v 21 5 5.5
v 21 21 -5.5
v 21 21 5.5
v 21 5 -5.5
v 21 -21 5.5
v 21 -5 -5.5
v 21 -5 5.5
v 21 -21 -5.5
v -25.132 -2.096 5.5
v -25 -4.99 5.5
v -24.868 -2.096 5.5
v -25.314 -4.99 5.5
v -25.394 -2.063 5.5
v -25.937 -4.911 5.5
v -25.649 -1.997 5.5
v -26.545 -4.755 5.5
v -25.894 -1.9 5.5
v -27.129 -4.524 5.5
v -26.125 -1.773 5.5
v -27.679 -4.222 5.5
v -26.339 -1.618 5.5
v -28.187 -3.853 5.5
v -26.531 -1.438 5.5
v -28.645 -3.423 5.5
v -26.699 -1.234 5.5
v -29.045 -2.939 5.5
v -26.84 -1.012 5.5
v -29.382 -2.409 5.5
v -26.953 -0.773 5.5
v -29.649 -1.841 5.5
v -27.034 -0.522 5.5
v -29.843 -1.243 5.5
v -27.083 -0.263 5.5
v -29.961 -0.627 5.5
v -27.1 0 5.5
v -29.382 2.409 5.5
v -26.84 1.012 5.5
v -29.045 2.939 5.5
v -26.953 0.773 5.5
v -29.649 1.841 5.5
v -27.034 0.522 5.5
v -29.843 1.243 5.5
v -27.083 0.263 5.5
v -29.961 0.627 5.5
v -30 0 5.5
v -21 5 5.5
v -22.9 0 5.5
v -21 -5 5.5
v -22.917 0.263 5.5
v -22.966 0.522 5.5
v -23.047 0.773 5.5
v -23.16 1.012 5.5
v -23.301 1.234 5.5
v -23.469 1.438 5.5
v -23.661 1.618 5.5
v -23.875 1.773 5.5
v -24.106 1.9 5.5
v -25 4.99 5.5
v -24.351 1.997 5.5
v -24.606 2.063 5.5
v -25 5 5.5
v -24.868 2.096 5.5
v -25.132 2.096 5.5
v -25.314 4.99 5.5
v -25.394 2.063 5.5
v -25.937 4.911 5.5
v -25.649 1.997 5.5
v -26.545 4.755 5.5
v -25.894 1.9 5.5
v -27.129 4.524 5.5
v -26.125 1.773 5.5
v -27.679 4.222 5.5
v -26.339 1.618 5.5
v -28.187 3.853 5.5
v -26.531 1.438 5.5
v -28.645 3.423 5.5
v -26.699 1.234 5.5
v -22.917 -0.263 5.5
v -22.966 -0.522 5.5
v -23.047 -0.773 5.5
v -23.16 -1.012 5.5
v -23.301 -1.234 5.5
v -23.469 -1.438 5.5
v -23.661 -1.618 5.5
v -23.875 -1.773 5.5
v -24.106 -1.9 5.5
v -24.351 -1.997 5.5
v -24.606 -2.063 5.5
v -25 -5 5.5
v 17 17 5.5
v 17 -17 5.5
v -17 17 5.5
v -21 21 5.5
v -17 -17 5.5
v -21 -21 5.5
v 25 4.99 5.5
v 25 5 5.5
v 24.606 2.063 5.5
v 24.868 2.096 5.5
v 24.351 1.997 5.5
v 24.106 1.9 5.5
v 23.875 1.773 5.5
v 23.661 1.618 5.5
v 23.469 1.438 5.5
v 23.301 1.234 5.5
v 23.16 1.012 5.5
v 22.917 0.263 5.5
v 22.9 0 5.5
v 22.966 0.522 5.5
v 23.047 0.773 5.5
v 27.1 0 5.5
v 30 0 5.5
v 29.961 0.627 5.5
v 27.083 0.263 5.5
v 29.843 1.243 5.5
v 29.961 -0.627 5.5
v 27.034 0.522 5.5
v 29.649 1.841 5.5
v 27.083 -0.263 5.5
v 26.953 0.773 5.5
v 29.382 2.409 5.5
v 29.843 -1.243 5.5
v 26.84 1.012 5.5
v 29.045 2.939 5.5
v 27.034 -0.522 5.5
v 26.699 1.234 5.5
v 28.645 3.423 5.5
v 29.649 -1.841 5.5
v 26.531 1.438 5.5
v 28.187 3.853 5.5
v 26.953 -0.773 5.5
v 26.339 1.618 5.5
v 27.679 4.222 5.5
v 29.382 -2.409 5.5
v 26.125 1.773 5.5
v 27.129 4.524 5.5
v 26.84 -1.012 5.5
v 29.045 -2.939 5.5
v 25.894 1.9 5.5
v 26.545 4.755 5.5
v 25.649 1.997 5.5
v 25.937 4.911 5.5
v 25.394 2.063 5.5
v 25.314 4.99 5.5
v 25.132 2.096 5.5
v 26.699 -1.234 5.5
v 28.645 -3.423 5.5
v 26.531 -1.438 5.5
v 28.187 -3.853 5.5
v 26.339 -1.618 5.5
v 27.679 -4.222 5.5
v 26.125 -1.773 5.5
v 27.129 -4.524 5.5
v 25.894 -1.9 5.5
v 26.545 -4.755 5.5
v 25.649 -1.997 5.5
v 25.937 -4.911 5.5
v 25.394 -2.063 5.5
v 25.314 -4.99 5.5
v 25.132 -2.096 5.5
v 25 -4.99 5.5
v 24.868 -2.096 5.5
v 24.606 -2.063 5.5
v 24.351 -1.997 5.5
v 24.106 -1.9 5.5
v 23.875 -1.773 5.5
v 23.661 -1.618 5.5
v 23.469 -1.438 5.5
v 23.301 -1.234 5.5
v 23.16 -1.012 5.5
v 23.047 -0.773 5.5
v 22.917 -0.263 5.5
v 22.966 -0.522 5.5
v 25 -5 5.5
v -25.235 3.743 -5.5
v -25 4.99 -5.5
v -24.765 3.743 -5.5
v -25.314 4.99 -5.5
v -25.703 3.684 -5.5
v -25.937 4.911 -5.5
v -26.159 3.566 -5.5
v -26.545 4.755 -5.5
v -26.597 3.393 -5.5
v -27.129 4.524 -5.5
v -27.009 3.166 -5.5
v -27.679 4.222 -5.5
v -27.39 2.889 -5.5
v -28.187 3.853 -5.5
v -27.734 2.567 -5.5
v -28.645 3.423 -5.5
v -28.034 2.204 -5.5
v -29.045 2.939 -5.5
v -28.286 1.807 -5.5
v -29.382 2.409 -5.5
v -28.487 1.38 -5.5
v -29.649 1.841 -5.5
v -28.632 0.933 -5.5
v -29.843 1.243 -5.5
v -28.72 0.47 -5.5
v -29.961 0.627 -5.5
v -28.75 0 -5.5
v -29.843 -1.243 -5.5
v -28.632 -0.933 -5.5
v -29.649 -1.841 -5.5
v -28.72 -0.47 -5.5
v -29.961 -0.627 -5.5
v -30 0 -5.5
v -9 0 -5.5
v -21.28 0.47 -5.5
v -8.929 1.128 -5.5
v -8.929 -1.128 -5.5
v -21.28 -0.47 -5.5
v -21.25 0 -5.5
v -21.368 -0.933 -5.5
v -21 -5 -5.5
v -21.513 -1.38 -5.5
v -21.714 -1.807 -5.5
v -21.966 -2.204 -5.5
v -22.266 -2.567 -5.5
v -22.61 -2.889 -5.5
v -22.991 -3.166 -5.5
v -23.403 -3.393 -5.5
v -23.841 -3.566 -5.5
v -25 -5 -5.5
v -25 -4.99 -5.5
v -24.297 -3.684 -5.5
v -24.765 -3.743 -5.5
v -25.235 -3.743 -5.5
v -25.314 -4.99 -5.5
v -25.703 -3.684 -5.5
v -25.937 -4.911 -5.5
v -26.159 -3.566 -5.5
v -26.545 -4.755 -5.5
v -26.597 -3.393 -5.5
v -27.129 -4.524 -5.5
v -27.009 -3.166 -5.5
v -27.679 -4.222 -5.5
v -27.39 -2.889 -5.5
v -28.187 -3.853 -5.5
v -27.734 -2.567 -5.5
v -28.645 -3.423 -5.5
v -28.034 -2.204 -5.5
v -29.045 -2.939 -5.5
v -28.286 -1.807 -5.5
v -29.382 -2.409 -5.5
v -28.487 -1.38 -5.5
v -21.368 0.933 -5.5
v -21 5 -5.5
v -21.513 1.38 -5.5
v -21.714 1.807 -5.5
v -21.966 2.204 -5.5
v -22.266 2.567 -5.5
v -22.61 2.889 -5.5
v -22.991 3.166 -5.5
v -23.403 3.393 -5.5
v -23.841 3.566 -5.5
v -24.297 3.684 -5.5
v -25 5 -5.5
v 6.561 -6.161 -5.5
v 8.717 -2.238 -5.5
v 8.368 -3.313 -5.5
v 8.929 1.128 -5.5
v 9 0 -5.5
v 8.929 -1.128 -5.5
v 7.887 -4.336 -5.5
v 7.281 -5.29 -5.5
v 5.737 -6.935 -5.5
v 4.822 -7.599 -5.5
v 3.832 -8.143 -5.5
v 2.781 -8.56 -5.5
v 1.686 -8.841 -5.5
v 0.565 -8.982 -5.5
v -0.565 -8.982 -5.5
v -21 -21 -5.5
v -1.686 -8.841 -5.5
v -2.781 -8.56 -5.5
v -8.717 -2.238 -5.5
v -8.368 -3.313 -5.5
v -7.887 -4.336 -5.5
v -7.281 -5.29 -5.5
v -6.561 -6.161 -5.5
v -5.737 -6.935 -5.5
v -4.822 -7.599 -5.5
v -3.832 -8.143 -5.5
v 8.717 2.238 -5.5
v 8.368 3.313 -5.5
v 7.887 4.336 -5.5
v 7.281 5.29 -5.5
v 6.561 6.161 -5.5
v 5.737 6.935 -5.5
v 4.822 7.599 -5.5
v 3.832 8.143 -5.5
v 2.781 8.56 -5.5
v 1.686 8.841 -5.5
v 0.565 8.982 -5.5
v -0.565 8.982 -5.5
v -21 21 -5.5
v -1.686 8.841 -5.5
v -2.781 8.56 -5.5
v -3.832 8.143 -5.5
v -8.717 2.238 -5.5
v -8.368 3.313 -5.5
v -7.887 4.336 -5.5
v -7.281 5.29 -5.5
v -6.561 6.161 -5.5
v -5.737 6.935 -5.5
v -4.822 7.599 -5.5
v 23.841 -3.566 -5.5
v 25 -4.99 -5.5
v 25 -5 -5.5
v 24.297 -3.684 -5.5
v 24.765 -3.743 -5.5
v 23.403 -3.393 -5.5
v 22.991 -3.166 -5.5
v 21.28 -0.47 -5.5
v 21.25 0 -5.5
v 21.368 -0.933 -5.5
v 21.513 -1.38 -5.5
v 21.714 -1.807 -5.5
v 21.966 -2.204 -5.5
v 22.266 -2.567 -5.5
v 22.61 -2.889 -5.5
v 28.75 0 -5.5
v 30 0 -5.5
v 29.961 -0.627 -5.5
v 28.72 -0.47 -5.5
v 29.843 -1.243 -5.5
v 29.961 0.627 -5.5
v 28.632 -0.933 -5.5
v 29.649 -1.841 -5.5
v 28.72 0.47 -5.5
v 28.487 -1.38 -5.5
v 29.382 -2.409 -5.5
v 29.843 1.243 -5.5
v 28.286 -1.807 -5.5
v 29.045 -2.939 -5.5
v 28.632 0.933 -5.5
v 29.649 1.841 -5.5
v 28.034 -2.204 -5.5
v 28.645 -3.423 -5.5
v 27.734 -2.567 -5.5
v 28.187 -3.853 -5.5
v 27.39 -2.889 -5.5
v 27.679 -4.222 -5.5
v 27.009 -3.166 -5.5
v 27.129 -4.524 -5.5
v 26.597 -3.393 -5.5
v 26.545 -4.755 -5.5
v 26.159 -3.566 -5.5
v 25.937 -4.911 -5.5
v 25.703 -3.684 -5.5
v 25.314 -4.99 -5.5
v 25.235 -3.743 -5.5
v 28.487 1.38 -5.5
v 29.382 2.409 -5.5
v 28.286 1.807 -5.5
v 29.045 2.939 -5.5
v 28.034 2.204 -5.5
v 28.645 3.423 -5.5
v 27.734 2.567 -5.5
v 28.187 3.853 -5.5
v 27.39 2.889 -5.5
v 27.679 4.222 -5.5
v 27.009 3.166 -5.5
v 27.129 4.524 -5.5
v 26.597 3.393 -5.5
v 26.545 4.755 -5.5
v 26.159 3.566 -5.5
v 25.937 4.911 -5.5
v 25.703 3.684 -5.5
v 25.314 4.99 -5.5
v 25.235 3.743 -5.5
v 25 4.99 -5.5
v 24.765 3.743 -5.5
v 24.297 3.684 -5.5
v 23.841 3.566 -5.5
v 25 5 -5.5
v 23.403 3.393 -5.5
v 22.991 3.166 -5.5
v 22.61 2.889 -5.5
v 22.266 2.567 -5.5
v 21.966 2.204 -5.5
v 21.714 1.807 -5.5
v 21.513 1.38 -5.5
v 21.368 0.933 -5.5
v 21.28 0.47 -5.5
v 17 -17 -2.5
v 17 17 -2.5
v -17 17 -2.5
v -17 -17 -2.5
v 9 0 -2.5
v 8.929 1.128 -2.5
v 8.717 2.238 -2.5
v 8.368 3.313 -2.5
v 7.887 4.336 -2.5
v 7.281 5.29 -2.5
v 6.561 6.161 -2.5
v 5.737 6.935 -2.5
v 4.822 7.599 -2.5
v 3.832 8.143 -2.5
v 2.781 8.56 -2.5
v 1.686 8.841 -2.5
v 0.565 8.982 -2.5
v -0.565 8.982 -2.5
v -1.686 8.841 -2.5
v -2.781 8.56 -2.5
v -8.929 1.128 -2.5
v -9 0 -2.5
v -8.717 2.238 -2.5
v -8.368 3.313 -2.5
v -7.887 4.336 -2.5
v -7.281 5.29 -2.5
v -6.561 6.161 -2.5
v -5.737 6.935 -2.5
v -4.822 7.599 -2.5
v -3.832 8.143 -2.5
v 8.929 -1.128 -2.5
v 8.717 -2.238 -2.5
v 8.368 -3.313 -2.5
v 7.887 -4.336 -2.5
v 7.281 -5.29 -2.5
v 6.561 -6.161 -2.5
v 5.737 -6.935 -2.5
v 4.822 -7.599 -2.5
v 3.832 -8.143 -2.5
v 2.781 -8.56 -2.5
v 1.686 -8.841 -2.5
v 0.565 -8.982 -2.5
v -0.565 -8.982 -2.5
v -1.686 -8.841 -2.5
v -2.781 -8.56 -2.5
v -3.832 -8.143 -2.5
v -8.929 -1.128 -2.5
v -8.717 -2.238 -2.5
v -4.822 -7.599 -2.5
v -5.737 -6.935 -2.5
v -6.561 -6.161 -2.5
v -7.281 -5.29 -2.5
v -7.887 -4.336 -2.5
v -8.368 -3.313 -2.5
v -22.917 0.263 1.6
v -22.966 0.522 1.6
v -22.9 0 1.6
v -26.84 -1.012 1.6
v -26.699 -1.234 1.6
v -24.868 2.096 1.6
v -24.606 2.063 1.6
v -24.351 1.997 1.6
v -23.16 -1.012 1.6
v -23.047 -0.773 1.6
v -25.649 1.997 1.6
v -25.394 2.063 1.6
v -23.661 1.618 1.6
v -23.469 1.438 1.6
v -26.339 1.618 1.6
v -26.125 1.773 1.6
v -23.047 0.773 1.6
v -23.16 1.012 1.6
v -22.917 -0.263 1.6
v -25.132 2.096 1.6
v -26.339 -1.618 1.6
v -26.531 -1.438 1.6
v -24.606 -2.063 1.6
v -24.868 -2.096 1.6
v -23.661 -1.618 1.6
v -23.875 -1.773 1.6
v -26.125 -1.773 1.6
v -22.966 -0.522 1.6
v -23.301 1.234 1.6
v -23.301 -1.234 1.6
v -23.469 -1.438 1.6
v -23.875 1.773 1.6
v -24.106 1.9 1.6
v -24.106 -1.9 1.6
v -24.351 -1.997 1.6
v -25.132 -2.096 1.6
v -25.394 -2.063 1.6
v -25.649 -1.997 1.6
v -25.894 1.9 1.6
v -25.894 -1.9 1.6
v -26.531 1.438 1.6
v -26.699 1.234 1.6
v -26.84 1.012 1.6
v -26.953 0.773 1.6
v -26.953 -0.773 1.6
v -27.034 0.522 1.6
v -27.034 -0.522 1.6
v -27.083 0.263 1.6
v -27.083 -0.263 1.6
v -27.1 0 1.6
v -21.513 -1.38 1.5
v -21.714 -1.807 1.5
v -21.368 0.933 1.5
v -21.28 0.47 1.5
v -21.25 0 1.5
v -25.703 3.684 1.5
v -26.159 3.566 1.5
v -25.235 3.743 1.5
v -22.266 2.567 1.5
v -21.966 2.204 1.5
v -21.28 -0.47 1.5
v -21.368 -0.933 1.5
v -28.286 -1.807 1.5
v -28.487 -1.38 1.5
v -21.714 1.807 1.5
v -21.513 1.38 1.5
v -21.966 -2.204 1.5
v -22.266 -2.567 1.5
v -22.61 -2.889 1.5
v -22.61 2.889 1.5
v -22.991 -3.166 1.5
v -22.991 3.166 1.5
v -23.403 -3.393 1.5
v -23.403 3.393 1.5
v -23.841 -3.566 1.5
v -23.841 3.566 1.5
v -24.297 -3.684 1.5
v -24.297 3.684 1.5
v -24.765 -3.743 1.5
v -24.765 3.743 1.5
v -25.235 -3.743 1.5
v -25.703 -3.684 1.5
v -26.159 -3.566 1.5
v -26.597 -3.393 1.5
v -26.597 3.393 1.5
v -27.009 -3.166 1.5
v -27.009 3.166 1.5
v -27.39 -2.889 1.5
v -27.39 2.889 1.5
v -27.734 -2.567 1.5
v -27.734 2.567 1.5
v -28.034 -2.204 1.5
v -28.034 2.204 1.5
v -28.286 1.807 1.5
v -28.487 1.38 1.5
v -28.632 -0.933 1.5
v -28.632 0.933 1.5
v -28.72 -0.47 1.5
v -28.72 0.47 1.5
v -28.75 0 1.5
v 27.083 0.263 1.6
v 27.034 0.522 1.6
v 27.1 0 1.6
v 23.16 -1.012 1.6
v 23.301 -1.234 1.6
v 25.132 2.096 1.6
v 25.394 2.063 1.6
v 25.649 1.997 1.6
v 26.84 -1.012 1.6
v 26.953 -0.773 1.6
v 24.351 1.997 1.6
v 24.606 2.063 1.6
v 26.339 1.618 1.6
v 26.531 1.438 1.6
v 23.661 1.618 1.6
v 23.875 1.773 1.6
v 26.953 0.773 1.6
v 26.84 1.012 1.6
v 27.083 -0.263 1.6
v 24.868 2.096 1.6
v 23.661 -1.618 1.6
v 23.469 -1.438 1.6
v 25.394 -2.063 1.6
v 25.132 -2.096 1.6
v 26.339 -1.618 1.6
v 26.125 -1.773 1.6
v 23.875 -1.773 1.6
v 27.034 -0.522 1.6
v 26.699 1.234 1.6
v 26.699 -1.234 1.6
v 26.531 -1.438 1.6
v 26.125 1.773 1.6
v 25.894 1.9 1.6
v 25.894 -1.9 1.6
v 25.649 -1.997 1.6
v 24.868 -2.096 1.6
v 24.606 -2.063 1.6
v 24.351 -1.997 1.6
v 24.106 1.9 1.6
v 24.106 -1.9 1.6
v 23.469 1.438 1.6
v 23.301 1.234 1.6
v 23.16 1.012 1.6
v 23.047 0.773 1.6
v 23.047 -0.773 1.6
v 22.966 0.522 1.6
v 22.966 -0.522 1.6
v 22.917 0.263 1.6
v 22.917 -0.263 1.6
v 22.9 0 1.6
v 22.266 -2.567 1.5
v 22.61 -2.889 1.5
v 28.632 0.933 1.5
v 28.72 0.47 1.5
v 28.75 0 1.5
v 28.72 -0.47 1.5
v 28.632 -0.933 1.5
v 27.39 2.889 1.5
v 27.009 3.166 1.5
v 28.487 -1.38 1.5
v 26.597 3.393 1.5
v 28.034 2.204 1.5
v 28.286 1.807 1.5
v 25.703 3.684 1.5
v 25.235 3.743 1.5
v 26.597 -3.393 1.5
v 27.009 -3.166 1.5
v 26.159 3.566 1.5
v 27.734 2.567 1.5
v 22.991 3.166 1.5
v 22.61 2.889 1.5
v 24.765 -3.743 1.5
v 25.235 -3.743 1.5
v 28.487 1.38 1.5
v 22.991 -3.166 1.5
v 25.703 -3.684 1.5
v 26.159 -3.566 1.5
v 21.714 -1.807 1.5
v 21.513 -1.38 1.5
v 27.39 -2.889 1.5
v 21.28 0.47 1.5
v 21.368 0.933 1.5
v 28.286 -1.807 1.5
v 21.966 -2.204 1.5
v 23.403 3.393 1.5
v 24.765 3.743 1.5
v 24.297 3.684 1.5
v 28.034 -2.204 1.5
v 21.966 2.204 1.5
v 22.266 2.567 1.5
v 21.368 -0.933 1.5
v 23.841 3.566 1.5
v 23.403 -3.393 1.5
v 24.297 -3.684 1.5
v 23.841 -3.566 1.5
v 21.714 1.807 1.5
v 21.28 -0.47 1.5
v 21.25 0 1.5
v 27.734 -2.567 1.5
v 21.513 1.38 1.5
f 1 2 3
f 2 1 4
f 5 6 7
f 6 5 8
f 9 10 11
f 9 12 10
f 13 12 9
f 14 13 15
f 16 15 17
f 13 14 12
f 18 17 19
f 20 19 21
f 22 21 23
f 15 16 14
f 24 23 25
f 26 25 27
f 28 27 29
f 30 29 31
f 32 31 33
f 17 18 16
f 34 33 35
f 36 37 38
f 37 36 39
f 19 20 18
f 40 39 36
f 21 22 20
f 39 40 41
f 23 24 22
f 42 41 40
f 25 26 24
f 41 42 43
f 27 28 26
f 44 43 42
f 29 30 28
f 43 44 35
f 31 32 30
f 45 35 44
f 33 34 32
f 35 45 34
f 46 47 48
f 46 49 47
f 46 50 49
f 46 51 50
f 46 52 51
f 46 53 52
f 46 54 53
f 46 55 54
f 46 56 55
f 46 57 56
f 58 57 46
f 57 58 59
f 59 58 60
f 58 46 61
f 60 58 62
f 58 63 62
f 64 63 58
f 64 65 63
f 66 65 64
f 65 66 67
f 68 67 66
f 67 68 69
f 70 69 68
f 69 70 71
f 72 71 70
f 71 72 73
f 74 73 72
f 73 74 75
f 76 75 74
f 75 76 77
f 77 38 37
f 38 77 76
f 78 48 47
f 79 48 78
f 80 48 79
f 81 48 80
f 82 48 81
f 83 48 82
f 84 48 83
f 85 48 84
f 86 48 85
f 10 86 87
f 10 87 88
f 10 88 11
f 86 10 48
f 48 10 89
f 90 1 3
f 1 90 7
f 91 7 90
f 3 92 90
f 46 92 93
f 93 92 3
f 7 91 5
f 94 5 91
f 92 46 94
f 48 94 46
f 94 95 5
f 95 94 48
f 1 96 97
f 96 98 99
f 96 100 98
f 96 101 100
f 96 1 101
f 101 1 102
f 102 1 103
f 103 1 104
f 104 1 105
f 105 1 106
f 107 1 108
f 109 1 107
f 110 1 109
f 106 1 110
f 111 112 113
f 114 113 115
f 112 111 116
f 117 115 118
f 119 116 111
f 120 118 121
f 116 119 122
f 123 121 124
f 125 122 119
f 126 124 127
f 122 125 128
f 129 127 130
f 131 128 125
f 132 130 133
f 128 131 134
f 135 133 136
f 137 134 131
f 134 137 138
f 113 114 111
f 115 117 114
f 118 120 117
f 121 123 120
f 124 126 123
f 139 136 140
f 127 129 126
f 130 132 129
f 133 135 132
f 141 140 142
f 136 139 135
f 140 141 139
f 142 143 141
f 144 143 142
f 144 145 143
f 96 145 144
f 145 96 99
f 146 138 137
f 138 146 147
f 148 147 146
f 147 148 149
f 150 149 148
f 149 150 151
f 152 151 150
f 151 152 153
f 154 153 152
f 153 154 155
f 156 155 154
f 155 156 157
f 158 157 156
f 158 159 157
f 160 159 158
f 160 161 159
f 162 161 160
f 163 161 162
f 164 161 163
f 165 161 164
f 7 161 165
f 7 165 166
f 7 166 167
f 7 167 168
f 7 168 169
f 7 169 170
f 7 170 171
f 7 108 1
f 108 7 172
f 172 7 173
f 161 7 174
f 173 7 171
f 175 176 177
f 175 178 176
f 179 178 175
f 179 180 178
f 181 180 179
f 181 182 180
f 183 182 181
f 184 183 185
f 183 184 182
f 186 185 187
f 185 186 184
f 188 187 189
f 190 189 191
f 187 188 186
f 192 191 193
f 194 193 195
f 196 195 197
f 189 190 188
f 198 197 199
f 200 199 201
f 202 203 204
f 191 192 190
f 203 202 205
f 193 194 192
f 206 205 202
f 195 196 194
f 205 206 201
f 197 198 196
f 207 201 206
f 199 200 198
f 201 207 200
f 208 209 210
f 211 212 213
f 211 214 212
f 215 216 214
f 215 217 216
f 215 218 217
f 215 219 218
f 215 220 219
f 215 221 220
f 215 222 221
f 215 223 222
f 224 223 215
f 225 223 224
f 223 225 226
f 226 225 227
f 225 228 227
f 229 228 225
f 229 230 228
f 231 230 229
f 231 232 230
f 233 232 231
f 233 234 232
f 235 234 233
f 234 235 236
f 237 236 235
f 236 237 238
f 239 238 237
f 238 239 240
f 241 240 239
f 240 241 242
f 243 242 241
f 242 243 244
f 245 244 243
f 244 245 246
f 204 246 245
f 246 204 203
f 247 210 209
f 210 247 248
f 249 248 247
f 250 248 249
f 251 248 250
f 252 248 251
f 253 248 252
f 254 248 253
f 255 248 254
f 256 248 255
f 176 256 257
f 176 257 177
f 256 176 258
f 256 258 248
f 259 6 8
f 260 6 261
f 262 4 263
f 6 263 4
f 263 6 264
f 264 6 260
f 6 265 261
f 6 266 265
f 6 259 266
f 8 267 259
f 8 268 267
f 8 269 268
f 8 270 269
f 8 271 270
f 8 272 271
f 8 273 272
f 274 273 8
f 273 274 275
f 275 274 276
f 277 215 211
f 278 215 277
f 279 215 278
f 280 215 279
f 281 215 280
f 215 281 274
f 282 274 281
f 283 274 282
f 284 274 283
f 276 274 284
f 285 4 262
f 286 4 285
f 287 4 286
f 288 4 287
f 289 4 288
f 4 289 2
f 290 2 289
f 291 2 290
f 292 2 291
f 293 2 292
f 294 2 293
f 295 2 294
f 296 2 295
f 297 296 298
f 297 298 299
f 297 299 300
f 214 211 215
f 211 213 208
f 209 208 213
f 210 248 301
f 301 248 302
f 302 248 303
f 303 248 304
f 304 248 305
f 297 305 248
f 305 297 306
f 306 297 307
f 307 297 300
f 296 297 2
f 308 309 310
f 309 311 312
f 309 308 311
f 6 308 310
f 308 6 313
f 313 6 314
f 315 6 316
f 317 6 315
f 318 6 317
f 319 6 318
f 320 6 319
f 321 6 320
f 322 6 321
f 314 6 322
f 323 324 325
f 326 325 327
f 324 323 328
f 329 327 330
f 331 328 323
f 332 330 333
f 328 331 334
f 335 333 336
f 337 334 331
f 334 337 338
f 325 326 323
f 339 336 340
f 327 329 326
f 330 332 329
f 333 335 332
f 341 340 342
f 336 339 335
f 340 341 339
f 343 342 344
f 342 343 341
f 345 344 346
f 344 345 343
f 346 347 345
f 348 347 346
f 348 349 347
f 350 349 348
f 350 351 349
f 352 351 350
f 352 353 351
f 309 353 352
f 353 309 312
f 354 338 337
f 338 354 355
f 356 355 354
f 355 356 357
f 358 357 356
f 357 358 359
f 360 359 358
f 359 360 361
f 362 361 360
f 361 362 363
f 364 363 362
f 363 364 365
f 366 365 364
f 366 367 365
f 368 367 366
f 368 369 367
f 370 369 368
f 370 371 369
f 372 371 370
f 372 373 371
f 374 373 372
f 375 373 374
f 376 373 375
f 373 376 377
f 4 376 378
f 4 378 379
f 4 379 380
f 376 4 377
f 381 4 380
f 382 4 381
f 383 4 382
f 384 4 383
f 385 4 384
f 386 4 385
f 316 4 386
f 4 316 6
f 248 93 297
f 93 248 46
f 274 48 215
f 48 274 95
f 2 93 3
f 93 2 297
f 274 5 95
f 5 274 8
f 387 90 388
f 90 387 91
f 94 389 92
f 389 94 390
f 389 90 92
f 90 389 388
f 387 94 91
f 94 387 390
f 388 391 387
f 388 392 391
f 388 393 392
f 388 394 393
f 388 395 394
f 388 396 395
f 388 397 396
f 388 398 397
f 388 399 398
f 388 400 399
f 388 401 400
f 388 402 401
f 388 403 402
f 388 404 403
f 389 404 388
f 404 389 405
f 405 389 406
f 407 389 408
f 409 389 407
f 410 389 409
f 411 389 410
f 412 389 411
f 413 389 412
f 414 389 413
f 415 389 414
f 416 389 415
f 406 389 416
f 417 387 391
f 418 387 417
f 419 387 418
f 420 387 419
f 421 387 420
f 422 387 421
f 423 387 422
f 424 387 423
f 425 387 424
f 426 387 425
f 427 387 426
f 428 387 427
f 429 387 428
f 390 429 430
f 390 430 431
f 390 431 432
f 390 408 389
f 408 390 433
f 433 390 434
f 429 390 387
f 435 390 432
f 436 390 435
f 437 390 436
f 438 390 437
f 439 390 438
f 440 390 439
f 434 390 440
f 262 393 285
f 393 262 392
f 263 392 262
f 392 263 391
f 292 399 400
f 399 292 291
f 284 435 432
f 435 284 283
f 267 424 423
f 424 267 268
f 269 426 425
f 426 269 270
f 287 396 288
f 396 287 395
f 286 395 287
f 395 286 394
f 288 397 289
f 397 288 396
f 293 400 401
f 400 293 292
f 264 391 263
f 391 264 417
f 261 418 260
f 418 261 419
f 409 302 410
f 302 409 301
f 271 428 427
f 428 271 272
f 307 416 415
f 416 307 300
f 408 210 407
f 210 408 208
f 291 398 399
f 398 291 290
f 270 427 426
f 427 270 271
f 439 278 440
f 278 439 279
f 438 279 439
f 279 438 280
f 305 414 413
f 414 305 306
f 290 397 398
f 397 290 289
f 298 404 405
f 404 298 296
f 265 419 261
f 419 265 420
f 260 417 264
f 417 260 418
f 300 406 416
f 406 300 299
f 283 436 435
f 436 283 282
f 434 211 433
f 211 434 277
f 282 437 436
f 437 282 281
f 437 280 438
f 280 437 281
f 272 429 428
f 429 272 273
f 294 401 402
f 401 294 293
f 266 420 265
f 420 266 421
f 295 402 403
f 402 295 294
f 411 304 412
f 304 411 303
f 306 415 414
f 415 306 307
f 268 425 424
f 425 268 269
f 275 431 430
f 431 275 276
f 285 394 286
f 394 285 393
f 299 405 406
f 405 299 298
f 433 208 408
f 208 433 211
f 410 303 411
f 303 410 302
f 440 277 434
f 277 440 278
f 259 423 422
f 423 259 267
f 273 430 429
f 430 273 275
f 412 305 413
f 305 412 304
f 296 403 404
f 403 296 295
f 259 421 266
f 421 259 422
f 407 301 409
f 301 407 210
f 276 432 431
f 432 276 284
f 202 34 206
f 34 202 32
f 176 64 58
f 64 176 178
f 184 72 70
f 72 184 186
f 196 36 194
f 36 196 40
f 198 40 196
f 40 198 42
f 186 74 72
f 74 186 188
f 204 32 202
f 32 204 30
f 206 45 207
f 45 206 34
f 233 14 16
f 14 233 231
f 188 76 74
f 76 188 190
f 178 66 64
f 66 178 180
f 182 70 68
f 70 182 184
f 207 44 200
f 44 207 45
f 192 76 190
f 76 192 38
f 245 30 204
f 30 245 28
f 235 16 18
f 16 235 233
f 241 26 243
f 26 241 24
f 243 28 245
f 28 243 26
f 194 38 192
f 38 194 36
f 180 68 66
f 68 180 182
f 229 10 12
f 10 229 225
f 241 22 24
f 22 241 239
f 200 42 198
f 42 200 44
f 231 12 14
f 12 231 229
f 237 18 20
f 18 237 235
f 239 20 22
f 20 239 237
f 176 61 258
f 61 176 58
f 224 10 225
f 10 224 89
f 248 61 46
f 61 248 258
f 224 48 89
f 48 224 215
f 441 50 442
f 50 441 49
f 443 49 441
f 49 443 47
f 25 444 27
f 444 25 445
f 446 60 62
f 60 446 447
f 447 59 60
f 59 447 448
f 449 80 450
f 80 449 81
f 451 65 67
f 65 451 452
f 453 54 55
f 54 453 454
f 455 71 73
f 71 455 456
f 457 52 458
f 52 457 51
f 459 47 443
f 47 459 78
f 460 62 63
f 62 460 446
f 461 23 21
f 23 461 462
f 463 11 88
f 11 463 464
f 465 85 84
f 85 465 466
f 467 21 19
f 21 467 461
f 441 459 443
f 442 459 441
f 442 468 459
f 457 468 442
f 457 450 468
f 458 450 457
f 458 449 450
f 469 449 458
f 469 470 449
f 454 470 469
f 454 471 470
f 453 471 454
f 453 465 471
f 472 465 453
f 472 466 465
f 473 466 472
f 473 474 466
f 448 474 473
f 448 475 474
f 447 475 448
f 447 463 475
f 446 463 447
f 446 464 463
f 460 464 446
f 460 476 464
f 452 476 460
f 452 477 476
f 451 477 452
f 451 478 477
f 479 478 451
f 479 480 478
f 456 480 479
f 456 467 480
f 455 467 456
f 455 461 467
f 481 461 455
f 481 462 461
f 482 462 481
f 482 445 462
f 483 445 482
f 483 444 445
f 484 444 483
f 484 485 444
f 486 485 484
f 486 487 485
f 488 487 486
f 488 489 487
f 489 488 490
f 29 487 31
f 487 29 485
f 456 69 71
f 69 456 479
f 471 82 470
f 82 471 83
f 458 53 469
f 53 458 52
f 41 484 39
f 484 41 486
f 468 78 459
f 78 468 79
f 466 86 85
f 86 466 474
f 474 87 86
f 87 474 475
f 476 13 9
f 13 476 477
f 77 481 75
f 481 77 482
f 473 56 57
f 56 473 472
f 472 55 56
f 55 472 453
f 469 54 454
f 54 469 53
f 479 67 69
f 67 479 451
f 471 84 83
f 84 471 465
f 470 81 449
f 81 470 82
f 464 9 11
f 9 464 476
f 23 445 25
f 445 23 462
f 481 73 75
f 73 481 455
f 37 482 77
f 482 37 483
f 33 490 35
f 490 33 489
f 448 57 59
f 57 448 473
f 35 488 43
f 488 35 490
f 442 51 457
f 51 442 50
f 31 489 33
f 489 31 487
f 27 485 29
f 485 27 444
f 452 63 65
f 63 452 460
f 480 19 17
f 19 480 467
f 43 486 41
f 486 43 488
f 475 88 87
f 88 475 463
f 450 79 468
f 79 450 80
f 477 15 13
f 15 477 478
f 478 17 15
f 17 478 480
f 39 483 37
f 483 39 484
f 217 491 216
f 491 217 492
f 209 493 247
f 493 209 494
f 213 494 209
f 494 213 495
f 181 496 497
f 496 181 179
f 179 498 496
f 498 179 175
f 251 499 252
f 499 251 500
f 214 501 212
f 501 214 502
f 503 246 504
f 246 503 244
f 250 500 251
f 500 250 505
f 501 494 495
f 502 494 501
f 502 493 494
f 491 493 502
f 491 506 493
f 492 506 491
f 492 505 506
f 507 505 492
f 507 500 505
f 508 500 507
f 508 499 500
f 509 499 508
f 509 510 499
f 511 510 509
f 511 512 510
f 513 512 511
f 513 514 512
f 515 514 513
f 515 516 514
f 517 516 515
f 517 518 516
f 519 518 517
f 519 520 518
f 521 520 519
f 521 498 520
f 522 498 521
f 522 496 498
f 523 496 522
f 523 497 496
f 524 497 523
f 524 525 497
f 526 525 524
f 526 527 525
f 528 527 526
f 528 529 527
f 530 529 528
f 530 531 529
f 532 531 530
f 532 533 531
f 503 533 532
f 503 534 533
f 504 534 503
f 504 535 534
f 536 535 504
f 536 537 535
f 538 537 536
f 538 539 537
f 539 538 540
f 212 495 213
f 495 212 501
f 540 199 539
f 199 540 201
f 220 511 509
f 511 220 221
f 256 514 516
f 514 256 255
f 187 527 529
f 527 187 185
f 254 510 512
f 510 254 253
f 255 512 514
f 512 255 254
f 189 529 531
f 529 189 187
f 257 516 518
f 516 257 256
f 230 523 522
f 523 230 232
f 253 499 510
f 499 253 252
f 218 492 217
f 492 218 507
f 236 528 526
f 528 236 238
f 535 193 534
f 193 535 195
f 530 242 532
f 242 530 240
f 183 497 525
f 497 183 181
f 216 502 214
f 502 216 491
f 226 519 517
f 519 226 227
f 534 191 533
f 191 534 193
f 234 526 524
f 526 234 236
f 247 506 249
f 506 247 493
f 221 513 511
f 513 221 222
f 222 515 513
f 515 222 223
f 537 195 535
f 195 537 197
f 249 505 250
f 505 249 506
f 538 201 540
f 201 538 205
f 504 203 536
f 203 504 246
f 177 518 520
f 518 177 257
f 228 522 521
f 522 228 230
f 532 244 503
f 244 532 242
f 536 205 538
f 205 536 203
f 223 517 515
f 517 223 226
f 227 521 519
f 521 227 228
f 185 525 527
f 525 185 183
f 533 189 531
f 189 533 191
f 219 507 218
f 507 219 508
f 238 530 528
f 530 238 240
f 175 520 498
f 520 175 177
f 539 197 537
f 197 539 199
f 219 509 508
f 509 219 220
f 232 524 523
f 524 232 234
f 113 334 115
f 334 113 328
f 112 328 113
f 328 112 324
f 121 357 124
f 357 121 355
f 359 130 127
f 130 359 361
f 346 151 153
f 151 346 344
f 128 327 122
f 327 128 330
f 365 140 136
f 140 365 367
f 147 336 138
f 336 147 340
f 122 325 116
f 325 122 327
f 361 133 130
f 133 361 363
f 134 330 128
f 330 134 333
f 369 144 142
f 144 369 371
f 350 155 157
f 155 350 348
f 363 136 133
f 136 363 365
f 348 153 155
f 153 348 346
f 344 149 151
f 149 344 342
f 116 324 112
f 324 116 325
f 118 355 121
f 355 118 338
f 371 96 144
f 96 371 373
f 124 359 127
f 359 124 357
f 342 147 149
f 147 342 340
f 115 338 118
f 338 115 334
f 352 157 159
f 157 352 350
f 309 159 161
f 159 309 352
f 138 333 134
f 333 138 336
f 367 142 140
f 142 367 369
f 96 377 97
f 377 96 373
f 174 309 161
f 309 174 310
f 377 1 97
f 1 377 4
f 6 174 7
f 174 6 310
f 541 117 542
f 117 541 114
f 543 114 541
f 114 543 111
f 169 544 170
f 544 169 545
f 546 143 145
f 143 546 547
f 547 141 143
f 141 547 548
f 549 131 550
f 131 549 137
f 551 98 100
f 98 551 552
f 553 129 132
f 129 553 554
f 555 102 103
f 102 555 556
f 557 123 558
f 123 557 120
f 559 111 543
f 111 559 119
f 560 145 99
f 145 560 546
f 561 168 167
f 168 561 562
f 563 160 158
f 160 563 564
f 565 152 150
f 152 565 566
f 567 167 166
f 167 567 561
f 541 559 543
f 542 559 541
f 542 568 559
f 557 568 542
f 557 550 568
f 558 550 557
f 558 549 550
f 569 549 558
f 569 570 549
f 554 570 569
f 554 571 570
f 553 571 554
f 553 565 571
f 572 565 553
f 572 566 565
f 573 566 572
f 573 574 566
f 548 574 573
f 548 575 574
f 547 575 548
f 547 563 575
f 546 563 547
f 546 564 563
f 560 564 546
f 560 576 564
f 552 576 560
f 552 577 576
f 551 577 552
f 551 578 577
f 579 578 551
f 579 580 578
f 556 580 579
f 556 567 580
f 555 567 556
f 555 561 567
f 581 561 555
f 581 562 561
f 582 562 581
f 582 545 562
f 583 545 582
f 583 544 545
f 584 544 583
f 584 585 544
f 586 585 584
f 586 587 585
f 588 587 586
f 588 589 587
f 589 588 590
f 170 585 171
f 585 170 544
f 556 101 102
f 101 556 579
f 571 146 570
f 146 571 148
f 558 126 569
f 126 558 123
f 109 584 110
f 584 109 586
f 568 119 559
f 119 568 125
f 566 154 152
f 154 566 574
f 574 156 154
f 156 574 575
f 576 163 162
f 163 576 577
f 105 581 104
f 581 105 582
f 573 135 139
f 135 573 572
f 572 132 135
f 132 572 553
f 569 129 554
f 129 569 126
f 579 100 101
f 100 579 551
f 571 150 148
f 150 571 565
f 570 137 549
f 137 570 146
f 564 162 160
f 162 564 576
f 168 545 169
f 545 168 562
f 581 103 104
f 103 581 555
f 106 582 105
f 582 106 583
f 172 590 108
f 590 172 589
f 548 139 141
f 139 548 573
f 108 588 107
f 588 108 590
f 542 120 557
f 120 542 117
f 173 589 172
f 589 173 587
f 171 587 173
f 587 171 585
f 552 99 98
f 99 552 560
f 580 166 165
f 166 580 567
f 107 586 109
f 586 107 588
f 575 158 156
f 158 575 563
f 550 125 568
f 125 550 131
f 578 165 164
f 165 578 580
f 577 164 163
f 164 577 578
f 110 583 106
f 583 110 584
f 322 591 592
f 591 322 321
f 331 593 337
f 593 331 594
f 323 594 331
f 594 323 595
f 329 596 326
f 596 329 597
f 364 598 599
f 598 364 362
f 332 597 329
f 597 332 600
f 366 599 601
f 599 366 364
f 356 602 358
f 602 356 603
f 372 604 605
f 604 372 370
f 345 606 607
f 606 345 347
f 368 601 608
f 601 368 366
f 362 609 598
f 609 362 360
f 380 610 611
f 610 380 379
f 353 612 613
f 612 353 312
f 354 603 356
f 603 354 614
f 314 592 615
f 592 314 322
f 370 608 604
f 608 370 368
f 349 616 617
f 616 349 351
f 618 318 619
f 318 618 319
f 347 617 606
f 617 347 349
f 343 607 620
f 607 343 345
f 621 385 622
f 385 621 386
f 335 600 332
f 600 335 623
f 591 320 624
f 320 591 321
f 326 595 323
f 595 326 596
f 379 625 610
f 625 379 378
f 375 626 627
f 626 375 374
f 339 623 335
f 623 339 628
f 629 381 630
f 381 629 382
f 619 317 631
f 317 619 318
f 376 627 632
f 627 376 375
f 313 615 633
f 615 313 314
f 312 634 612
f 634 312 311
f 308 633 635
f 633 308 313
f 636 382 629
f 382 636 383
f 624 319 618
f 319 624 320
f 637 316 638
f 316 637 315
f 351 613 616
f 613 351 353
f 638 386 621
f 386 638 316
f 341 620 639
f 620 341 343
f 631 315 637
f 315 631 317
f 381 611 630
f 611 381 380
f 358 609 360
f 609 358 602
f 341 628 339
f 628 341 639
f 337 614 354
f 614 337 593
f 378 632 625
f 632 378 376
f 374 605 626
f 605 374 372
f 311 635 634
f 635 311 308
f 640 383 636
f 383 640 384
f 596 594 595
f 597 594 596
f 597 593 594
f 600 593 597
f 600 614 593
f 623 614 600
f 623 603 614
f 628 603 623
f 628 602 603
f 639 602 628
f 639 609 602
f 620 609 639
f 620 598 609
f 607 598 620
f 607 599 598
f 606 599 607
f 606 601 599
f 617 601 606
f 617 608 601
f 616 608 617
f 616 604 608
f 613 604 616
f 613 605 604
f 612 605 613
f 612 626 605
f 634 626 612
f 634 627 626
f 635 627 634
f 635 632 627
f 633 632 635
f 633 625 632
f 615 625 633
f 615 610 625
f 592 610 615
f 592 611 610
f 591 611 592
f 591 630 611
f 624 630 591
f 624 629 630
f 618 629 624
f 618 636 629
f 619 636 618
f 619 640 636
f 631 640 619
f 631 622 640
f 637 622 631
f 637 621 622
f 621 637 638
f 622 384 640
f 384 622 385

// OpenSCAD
//
// FRONTplate of ArduCam IMX291
//

camera_square = 38.00;
lip_width = 2;          // still used - to indicate size beyond the camera square
depth = 11;             // might call this height - it's depth relative to how deep is the box
face_thickness = 3;
m4_depth = 4;   // m4 thickness = depth - countersink
m4_screw_head_dia = 7.5;

circuit_board_thickness = 1.75;

globe_major = 10;
globe_pilot = 4.2;
globe_bar_thickness = 4;

globe_bar_width = 4;

lense_dia = 18;

$fn = 50;

union() {
    difference() {
        {
        // major square
        cube([camera_square + (2*lip_width), 
            camera_square + (2*lip_width), 
            depth], center=true);
        }
        // subtract the center
        {
        // remove the center
        cube([camera_square - (2*lip_width), 
            camera_square - (2*lip_width), 
            depth], center=true);

        }
    }
    
    // add globe mount 
    difference() {
        {
        // face plate
        translate([0,0,-(depth/2 - face_thickness/2)])
        cube([camera_square,
            camera_square,
            face_thickness], center=true);    
        }
        // camera lense hole
        {
        translate([0,0,-(depth/2 - face_thickness/2)])
        cylinder(r = lense_dia/2, h = face_thickness, center = true); 
        }
        
    } // end of globe mount
    
    // add side mounts
    // left side
    countersink_depth = depth - m4_depth;
    difference () {
        union () {
        translate([-((camera_square+2)/2 + globe_major/2),0,0])
        cylinder(r = globe_major/2, h = depth, center = true);
        
        translate([-((camera_square+2)/2 + globe_major/4),0,0])
        cube([globe_major/2, globe_major, depth], center = true);
        }
        // screw hole
        {
        translate([-((camera_square+2)/2 + globe_major/2),0, (depth/2 - m4_depth/2 + 0.1)])
        #cylinder(r = globe_pilot/2, h = m4_depth, center = true);
        // countersink
        translate([-((camera_square+2)/2 + globe_major/2),0, -depth/2 + countersink_depth/2])
        cylinder(r = m4_screw_head_dia/2, h = countersink_depth, center = true); 
        }
    }
    // right side
    difference () {
        union () {
        translate([((camera_square+2)/2 + globe_major/2),0,0])
        cylinder(r = globe_major/2, h = depth, center = true);
        
        translate([((camera_square+2)/2 + globe_major/4),0,0])
        cube([globe_major/2, globe_major, depth], center = true);
        }
        // screw hole
        {
        translate([((camera_square+2)/2 + globe_major/2),0, (depth/2 - m4_depth/2 + 0.1)])
        #cylinder(r = globe_pilot/2, h = m4_depth, center = true);
        // countersink
        translate([((camera_square+2)/2 + globe_major/2),0, -depth/2 + countersink_depth/2])
        cylinder(r = m4_screw_head_dia/2, h = countersink_depth, center = true); 
        }
    }
} // union
